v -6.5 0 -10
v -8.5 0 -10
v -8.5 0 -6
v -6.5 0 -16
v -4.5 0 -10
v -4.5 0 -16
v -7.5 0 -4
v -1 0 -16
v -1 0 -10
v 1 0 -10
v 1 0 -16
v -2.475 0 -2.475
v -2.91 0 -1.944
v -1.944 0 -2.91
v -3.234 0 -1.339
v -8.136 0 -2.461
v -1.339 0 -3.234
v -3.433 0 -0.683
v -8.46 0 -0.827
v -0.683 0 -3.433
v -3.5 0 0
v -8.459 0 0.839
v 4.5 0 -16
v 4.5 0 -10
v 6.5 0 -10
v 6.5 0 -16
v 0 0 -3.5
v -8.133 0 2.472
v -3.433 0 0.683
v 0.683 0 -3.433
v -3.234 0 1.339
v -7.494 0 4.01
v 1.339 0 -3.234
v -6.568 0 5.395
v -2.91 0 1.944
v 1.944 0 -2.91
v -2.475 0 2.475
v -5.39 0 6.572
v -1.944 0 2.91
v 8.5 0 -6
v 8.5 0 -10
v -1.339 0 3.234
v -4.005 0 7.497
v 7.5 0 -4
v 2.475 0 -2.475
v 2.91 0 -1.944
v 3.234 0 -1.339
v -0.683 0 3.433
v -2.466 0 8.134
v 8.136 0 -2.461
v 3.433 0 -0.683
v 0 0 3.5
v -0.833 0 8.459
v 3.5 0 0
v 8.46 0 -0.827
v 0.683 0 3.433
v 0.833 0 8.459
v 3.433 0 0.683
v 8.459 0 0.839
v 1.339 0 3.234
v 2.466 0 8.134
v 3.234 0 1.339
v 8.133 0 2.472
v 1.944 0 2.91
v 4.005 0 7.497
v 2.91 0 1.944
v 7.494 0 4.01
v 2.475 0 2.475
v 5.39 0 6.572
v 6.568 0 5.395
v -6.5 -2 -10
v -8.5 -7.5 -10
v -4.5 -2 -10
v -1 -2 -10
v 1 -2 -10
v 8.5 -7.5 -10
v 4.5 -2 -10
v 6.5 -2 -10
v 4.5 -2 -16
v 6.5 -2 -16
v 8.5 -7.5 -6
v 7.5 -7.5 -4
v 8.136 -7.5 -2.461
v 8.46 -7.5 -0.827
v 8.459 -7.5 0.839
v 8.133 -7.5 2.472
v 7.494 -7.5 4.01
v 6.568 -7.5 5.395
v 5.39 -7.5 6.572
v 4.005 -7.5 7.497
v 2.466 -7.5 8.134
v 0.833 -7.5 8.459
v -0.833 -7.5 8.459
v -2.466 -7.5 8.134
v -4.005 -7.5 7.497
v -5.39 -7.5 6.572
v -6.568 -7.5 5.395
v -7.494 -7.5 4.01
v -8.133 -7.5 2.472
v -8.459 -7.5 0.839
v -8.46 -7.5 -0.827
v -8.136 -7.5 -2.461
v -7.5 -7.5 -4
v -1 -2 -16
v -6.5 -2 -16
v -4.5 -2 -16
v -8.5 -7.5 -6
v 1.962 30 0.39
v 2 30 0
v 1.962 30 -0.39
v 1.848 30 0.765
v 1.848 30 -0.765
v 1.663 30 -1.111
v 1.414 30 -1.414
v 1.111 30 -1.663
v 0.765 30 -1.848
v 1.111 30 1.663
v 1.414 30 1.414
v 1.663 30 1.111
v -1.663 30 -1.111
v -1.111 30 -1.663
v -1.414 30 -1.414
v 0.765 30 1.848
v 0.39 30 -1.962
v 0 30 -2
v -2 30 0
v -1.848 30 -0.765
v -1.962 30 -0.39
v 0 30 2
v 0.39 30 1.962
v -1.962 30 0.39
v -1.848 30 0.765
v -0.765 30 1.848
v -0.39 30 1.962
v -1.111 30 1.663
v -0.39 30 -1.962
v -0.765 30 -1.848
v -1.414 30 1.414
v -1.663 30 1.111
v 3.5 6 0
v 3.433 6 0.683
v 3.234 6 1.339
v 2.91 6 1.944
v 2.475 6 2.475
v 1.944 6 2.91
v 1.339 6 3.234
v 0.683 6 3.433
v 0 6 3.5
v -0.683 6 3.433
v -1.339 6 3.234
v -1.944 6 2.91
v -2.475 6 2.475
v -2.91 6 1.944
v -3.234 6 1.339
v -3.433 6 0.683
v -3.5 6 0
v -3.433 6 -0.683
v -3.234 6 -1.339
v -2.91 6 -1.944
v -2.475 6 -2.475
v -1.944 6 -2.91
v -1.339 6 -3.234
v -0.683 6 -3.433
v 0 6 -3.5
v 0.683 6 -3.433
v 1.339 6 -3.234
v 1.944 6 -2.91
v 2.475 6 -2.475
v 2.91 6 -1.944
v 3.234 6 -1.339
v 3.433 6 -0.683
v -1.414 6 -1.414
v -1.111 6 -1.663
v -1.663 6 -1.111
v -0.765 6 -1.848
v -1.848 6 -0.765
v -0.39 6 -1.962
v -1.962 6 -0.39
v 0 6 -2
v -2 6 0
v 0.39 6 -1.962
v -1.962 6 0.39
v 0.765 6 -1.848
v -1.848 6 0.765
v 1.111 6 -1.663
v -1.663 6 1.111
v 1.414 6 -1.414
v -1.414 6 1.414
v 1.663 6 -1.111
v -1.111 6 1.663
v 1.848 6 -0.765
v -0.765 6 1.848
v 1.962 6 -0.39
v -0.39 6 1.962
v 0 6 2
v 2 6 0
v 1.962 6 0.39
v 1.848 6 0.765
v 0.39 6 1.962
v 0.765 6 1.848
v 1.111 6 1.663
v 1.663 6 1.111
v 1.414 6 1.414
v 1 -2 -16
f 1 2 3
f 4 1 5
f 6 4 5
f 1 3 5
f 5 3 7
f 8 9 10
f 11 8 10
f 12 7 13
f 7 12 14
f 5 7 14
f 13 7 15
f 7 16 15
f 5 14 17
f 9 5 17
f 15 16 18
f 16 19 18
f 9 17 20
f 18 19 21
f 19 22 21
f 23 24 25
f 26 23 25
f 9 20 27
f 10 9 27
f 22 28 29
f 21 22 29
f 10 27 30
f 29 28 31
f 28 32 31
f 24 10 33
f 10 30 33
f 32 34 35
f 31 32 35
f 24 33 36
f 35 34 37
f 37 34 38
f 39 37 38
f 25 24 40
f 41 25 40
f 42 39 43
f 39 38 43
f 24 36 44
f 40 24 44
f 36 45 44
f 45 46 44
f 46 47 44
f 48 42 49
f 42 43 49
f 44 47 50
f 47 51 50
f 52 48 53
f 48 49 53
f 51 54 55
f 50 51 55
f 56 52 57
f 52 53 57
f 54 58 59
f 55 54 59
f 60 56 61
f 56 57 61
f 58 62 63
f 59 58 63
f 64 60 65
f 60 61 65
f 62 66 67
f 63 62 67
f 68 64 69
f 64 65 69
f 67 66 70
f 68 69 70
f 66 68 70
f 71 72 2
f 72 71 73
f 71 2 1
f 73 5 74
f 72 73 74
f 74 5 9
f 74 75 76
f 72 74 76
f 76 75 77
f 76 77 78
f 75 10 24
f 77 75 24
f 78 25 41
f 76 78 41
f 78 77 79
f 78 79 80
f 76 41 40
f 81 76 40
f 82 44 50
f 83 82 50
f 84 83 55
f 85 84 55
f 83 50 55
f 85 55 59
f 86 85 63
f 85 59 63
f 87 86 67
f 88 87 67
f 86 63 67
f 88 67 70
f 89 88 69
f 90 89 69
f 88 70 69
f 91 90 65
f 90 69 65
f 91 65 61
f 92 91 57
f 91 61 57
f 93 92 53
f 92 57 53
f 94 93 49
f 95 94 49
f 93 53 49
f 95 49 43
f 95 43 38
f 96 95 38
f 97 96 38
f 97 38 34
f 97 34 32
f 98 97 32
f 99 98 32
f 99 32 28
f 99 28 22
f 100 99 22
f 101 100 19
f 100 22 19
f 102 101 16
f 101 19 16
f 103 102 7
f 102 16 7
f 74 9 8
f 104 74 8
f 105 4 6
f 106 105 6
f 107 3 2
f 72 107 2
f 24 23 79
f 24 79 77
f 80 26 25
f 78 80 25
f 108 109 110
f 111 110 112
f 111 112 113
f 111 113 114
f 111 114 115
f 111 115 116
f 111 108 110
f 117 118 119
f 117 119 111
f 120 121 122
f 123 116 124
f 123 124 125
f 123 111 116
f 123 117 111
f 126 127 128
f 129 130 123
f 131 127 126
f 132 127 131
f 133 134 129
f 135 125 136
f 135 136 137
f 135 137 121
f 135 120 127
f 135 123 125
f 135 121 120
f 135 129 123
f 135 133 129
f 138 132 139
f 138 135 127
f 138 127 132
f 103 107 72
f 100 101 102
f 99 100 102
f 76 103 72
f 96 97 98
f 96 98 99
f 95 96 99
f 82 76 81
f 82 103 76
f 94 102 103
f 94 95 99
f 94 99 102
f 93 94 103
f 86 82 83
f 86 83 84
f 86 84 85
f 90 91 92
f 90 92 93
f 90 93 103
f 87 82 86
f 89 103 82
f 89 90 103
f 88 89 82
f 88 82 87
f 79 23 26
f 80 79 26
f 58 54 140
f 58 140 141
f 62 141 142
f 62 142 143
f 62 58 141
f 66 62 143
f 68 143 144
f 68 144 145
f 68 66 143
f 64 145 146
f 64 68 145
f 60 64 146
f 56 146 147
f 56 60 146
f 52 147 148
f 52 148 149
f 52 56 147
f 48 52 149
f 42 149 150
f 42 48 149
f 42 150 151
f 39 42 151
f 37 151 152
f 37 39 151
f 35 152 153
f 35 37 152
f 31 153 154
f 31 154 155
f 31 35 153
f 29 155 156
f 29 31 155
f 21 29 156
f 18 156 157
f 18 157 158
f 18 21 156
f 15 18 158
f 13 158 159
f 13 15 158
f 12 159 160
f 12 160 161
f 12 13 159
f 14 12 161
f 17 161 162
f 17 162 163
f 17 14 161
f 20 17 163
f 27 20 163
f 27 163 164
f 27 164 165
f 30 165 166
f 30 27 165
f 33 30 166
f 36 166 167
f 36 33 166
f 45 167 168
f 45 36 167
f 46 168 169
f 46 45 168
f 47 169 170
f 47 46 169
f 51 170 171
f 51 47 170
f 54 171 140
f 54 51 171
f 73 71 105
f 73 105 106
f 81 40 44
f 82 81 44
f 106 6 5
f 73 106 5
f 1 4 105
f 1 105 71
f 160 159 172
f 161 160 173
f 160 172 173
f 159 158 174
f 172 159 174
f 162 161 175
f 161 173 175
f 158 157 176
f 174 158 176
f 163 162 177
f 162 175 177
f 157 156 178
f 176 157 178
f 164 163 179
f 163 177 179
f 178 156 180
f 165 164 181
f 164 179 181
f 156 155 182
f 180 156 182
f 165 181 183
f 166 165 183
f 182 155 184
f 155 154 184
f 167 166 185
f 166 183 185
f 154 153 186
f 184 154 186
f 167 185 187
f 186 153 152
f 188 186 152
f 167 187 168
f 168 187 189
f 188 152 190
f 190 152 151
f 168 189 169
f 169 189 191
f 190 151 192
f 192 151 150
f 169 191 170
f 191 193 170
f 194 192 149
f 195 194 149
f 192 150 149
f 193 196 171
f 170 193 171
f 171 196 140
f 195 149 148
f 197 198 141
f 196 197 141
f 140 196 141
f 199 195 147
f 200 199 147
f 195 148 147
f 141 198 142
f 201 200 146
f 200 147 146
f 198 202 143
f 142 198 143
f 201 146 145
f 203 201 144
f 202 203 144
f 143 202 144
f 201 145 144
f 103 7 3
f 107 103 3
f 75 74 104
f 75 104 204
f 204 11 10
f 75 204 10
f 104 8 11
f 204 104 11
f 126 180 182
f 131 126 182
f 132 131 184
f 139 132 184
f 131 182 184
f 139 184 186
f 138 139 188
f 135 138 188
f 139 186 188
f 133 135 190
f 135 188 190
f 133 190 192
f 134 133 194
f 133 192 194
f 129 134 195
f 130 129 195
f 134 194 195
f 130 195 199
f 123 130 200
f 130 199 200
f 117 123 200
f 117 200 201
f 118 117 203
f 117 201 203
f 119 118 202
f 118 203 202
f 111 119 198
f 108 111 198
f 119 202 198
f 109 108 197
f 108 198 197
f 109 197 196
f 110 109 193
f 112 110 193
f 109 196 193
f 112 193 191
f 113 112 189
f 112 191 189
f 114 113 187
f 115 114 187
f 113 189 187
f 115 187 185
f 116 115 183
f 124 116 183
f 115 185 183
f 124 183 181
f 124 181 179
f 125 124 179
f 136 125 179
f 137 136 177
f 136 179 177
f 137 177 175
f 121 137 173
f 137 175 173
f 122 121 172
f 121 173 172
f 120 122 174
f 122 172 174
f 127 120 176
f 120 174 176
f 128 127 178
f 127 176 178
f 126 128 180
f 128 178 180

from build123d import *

# Parameters (mm, degrees)
F1_DEPTH = 7.5
F0_W     = 2
F0_H     = 6
F2_DEPTH = 2
F3_R     = 3.5
F4_DEPTH = 6
F5_R     = 2
F6_DEPTH = 24


with BuildPart() as f1:
    # F0 (on Front) → F1 (new body)
    with BuildSketch(Plane.XZ):
        with BuildLine():
            Line((-7.5, -4), (7.5, -4))
            ThreePointArc((7.5, -4), (0, 8.5), (-7.5, -4))
        make_face()
        Polygon((8.5, -6), (7.5, -4), (-7.5, -4), (-8.5, -6), (-8.5, -10), (-6.5, -10), (-4.5, -10), (-1, -10), (0, -10), (1, -10), (4.5, -10), (6.5, -10), (8.5, -10), align=None)
    extrude(amount=F1_DEPTH)

    # F0 (on Front) → F2 (join)
    with BuildSketch(Plane.XZ):
        with Locations((-5.5, -13)):
            Rectangle(F0_W, F0_H)
        Polygon((1, -16), (1, -10), (0, -10), (-1, -10), (-1, -16), align=None)
        with Locations((5.5, -13)):
            Rectangle(F0_W, F0_H)
    extrude(amount=F2_DEPTH)

    # F3 (on face) → F4 (join)
    with BuildSketch(Plane.XZ):
        Circle(F3_R)
    extrude(amount=-F4_DEPTH)

    # F5 (on face) → F6 (join)
    with BuildSketch(Plane(origin=(0, 6, 0), x_dir=(-1, 0, 0), z_dir=(0, 1, 0))):
        Circle(F5_R)
    extrude(amount=F6_DEPTH)


solid = f1.part
